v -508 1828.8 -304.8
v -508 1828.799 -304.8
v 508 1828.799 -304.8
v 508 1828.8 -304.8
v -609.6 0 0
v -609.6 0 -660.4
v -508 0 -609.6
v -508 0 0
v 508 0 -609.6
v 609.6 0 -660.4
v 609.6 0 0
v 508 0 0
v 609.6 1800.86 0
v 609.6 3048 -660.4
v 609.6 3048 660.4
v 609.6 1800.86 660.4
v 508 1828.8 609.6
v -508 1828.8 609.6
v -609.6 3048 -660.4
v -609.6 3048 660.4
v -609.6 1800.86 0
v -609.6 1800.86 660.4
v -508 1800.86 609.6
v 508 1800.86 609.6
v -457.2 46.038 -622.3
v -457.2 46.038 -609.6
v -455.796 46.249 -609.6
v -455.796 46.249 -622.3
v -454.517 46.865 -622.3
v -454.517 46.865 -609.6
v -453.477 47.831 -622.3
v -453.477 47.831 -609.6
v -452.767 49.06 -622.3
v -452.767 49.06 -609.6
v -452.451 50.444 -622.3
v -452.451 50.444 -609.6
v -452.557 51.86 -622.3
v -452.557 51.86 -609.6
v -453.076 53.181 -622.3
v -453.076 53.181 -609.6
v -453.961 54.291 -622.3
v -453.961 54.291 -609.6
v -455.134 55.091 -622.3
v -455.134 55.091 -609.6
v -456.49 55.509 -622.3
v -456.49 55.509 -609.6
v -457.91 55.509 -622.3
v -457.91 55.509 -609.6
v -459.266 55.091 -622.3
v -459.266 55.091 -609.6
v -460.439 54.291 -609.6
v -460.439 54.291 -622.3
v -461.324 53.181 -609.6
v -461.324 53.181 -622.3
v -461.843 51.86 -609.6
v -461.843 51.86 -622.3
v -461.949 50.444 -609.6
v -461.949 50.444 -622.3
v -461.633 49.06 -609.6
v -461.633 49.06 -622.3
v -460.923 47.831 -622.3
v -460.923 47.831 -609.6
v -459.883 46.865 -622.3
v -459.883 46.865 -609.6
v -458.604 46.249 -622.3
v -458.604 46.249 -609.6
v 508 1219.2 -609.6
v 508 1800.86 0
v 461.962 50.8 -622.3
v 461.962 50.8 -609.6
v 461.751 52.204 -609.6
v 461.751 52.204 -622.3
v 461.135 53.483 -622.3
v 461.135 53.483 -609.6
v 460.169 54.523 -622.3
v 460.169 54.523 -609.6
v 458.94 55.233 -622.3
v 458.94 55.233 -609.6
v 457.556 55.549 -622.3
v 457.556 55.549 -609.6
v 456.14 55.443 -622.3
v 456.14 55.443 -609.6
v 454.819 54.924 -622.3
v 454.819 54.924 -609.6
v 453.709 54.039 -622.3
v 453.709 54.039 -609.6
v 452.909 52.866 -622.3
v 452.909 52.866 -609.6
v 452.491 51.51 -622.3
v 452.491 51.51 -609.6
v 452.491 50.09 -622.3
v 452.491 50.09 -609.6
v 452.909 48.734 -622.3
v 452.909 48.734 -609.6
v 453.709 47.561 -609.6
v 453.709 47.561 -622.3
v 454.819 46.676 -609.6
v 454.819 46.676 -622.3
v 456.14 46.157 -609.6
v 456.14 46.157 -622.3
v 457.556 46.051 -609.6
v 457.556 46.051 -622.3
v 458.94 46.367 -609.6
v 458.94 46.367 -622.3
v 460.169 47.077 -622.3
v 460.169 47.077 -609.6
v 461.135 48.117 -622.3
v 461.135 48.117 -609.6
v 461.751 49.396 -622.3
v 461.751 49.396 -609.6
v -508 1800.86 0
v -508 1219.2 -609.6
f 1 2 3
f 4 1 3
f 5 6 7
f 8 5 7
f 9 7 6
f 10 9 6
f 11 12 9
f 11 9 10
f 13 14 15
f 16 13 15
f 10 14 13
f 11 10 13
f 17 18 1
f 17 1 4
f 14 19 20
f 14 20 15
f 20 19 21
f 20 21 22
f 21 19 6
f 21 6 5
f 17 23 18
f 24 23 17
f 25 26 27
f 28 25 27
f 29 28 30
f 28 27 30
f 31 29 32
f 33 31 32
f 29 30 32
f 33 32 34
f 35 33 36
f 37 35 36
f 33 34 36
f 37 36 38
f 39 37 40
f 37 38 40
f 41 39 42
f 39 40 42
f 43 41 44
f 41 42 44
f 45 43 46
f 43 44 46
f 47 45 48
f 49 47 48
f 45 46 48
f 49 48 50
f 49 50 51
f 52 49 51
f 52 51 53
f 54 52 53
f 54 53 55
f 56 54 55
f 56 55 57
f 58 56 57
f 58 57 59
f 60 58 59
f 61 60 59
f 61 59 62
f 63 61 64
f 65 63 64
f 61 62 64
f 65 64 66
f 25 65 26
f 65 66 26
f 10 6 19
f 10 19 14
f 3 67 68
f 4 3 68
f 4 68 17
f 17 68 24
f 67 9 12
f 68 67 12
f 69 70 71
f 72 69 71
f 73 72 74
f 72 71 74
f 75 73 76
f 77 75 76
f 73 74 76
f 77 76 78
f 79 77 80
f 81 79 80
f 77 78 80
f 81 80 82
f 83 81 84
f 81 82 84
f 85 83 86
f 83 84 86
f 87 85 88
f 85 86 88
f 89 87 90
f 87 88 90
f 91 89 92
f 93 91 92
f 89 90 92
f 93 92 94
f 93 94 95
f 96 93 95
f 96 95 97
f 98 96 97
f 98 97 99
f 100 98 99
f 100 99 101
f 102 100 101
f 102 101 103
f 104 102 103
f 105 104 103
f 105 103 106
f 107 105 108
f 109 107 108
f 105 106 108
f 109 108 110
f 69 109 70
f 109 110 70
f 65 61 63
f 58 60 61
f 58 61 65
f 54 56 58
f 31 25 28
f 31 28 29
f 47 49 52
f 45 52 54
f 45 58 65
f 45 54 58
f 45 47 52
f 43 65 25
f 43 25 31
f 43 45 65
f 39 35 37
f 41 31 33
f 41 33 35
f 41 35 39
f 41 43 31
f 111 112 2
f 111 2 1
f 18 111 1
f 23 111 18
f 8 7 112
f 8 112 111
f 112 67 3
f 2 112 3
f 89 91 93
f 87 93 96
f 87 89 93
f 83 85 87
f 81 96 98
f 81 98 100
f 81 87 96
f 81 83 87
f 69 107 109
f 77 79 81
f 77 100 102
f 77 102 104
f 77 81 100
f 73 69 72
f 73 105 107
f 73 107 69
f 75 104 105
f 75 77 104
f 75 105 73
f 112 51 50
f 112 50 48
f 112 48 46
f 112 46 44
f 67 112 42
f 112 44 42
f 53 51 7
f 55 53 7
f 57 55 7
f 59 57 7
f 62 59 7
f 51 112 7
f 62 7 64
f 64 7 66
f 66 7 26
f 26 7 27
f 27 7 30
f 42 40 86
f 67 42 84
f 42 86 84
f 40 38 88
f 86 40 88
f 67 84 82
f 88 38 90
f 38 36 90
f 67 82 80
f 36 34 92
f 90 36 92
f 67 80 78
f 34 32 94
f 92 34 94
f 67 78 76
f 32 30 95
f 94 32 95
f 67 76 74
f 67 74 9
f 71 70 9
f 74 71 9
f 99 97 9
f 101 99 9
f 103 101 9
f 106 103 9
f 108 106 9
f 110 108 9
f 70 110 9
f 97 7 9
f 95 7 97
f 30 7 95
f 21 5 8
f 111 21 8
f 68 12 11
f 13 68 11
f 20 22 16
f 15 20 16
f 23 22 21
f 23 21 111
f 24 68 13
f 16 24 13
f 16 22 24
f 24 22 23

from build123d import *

# Parameters (mm, degrees)
F0_W          = 1219.2
F0_H          = 1320.8
F1_DEPTH      = 3048
F2_W          = 1016
F2_H          = 1219.2
F3_DEPTH      = 1219.2
F4_W          = 1016
F4_H          = 914.4
F5_DEPTH      = 609.6
F8_DEPTH      = 508
F8_DEPTH_BACK = 508
F9_W          = 1219.2
F9_H          = 660.4
F10_DEPTH     = 1800.86
F12_DEPTH     = 12.7


with BuildPart() as f1:
    # F0 (on Front) → F1 (new body)
    with BuildSketch(Plane.XZ):
        Rectangle(F0_W, F0_H)
    extrude(amount=-F1_DEPTH)

    # F2 (on face) → F3 (cut)
    with BuildSketch(Plane.XZ):
        Rectangle(F2_W, F2_H)
    extrude(amount=-F3_DEPTH, mode=Mode.SUBTRACT)

    # F4 (on face) → F5 (cut)
    with BuildSketch(Plane.XZ.offset(-1219.2)):
        with Locations((0, 152.4)):
            Rectangle(F4_W, F4_H)
    extrude(amount=-F5_DEPTH, mode=Mode.SUBTRACT)

    # F7 (on mid) → F8 (cut, two sides)
    with BuildSketch(Plane.YZ) as f8_sk:
        Polygon((1828.7993829124, 0), (0, 0), (0, -609.6), (1219.2, -609.6), (1828.7993829124, -304.7996592282), align=None)
    extrude(amount=-F8_DEPTH, mode=Mode.SUBTRACT)
    extrude(f8_sk.sketch, amount=F8_DEPTH_BACK, mode=Mode.SUBTRACT)

    # F9 (on face) → F10 (cut)
    with BuildSketch(Plane.XZ):
        with Locations((0, 330.2)):
            Rectangle(F9_W, F9_H)
    extrude(amount=-F10_DEPTH, mode=Mode.SUBTRACT)

    # F11 (on face) → F12 (cut)
    with BuildSketch(Plane.XY.offset(-609.6)):
        with BuildLine():
            Line((-457.2, 50.8), (-457.2, 46.0375))
            ThreePointArc((-457.2, 46.0375), (-453.8324039546, 47.4324039546), (-452.4375, 50.8))
            ThreePointArc((-452.4375, 50.8), (-457.2, 55.5625), (-461.9625, 50.8))
            Line((-461.9625, 50.8), (-457.2, 50.8))
        make_face()
        with BuildLine():
            ThreePointArc((-461.9625, 50.8), (-460.5675960454, 47.4324039546), (-457.2, 46.0375))
            Line((-457.2, 46.0375), (-457.2, 50.8))
            Line((-457.2, 50.8), (-461.9625, 50.8))
        make_face()
        with BuildLine():
            Line((457.2, 50.8), (457.2, 46.0375))
            ThreePointArc((457.2, 46.0375), (460.5675960454, 47.4324039546), (461.9625, 50.8))
            Line((461.9625, 50.8), (457.2, 50.8))
        make_face()
        with BuildLine():
            ThreePointArc((461.9625, 50.8), (453.8324039546, 54.1675960454), (457.2, 46.0375))
            Line((457.2, 46.0375), (457.2, 50.8))
            Line((457.2, 50.8), (461.9625, 50.8))
        make_face()
    extrude(amount=-F12_DEPTH, mode=Mode.SUBTRACT)


solid = f1.part
